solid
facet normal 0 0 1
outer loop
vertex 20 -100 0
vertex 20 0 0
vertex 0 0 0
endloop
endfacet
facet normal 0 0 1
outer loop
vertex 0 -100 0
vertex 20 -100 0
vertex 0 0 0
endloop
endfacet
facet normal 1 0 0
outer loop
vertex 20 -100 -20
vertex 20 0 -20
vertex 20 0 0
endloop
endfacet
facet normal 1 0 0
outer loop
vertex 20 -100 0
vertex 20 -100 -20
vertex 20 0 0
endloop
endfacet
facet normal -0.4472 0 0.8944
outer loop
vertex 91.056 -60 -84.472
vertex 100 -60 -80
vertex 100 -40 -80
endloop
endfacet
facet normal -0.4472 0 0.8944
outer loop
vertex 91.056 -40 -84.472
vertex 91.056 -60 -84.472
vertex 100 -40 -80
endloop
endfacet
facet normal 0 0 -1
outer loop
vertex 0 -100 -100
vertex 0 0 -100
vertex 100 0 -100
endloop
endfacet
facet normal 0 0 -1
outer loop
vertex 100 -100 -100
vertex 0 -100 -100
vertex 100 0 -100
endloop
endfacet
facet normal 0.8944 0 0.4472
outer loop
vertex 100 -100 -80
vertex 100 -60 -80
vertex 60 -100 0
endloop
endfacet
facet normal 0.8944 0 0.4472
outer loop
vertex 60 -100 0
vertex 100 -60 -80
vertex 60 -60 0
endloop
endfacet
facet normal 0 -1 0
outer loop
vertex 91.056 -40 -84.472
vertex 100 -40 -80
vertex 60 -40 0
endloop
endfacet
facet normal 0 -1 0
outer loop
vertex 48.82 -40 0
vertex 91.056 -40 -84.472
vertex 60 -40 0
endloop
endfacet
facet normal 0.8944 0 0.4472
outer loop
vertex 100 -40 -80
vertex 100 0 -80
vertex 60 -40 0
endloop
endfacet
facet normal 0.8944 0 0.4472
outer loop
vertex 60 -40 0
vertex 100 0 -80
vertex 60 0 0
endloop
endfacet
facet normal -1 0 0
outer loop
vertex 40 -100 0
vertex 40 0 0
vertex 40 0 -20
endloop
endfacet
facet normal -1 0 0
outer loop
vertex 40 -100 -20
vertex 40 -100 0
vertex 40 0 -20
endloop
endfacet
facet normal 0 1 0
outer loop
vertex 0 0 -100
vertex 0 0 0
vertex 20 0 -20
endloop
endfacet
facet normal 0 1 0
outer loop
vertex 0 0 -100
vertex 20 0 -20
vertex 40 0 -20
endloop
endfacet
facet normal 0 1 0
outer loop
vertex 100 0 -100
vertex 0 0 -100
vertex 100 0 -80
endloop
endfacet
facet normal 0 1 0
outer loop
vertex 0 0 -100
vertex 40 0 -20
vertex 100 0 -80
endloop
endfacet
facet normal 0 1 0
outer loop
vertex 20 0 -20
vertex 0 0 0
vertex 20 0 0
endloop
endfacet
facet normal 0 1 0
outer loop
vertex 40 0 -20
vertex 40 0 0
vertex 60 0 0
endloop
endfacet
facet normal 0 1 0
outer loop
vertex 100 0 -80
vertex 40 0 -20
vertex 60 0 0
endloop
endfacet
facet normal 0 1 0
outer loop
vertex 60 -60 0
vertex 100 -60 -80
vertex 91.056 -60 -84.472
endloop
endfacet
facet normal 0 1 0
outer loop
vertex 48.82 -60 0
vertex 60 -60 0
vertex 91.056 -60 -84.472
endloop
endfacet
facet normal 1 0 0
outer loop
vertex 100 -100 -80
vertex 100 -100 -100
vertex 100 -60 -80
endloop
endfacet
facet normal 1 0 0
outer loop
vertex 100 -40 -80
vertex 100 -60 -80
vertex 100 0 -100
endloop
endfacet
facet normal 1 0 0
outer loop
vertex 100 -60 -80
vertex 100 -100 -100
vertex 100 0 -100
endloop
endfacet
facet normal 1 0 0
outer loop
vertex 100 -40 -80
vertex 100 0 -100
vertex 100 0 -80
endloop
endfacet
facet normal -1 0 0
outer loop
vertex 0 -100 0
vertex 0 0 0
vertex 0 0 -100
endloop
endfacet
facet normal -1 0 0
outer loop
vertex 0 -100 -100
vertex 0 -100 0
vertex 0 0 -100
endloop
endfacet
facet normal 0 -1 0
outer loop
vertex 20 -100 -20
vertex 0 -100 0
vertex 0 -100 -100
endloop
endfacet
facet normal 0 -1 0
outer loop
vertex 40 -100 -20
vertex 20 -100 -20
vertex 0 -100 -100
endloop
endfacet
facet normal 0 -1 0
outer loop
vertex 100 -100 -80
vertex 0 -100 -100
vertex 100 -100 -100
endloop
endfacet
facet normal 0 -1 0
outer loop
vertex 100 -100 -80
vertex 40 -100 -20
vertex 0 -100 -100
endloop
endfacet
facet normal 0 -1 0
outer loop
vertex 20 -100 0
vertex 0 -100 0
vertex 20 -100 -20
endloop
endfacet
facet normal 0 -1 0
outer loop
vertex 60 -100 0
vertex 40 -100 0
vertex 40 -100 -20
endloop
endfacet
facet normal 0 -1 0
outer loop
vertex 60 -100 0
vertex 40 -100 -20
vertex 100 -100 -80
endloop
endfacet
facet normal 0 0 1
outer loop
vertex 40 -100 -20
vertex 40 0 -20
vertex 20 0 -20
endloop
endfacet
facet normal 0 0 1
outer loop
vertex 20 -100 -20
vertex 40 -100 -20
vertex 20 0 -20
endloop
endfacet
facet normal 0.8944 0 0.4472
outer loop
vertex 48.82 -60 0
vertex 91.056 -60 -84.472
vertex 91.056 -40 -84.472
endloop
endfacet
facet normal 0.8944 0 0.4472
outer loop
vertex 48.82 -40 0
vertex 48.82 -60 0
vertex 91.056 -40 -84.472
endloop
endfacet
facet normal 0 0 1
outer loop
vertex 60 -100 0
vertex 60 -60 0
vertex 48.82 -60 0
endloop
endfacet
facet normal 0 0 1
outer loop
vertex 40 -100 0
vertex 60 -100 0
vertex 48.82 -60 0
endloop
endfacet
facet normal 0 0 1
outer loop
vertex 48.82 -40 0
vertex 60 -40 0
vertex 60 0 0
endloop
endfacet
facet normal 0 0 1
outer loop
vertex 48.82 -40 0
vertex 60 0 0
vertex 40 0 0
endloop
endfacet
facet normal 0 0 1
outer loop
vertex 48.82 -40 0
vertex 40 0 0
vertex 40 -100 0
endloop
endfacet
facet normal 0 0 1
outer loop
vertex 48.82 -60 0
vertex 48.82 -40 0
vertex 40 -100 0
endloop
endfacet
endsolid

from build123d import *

# Parameters (mm, degrees)
F1_DEPTH = 100
F2_W     = 20
F2_H     = 89.4427191
F3_DEPTH = 10
F4_DEPTH = 10


with BuildPart() as f1:
    # F0 (on Front) → F1 (new body)
    with BuildSketch(Plane.XZ):
        Polygon((20, 0), (0, 0), (0, -100), (100, -100), (100, -80), (60, 0), (40, 0), (40, -20), (20, -20), align=None)
    extrude(amount=F1_DEPTH)

    # F2 (on face) → F3 (cut)
    with BuildSketch(Plane(origin=(48, 0, 24), x_dir=(0, 1, 0), z_dir=(0.894427191, 0, 0.4472135955))):
        with Locations((-50, -71.55417528)):
            Rectangle(F2_W, F2_H)
    extrude(amount=-F3_DEPTH, mode=Mode.SUBTRACT)

    # F4 (cut): a face of the model
    f4_faces = [f1.faces().sort_by_distance(p)[0] for p in [
        (55.527864045, -50, -2.2360679775),
    ]]
    extrude(f4_faces, amount=-F4_DEPTH, mode=Mode.SUBTRACT)


solid = f1.part
